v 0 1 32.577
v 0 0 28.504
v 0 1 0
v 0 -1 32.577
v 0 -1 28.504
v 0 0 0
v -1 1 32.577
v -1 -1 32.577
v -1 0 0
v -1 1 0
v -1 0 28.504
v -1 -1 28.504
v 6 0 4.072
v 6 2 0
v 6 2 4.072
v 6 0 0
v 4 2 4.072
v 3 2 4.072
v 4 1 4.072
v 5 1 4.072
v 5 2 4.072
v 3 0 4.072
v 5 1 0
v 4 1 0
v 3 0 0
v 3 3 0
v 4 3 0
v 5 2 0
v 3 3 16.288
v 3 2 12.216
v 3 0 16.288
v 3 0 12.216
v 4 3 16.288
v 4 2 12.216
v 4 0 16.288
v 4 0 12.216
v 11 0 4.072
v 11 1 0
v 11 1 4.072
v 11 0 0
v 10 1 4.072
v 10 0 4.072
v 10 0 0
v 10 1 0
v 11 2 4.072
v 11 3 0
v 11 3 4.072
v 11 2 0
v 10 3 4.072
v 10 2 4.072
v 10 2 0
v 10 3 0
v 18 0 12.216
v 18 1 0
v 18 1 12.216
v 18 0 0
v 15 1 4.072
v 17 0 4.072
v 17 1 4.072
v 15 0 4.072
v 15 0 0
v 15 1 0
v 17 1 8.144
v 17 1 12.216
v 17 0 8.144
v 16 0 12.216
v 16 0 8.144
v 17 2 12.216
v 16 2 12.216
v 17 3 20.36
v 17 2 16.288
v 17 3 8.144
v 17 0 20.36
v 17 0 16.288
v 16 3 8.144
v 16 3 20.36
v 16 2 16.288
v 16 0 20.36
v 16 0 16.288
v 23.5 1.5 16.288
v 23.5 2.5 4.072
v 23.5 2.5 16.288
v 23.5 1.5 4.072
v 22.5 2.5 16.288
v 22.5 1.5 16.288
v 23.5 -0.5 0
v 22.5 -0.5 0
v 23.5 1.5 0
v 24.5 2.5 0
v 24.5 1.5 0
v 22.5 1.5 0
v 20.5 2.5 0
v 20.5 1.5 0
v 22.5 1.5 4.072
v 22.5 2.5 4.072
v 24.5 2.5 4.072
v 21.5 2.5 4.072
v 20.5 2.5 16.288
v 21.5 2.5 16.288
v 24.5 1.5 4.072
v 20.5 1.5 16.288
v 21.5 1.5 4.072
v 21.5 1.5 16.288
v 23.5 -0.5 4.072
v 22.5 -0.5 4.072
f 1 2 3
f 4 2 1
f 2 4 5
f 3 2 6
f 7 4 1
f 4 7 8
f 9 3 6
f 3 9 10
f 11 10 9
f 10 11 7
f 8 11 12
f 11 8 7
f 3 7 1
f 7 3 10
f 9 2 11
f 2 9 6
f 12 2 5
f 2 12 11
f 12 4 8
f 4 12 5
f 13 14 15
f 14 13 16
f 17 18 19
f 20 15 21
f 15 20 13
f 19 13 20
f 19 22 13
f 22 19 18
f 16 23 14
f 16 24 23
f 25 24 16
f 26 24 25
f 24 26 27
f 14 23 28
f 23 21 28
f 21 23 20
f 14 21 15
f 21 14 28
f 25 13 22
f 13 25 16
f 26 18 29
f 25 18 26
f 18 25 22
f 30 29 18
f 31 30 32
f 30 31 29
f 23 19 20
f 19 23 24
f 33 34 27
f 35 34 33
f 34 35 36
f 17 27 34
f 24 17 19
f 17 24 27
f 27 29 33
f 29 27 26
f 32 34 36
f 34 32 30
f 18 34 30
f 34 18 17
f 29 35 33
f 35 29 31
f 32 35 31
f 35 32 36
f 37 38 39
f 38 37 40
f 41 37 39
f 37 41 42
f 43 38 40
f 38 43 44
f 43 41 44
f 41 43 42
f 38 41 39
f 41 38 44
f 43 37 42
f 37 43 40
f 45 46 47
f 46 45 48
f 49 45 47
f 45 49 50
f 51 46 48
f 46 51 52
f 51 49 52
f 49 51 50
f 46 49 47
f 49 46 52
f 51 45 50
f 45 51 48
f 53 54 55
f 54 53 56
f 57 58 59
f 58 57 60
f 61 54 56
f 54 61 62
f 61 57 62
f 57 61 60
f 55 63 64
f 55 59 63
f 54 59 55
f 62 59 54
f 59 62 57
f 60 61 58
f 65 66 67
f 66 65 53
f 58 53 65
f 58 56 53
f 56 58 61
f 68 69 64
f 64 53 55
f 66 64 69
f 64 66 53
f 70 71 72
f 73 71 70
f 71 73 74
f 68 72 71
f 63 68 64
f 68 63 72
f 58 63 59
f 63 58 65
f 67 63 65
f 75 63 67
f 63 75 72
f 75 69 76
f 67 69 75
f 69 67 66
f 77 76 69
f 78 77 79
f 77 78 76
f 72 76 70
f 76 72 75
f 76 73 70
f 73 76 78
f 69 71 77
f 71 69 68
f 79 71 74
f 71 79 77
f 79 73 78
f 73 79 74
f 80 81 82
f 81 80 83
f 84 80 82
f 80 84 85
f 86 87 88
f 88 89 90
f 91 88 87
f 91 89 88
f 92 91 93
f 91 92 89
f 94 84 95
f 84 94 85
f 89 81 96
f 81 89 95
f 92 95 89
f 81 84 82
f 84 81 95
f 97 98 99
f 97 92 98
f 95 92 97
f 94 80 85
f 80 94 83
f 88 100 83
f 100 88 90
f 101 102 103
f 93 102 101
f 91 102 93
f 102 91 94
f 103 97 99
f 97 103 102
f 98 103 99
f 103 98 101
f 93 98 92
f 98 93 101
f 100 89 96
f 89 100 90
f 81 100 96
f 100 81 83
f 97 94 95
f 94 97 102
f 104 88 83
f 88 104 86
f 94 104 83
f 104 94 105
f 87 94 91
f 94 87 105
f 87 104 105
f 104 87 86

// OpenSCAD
/*
(c) 2020 Creative Common 4.0 Attribution (BY)
https://creativecommons.org/licenses/by/4.0/

!!! For best result set View -> Orthogonal in OpenSCAD !!!

Print custom numbers by variables

Create a 3D objects in stl format. To use special symbols like +-.,:; 
pay attention to the quotes

openscad -o ./result_5_deg.stl -D "\$angle=5" -D "text=\"12:34\"" ./print_numbers.scad

or with command line variables. a - angle of view, text - text with supported symbols.
pay attention to the quotes.

a=5; 
text="12:34";
openscad -o "./result_${a}_deg.stl" -D "\$angle=$a" -D "text=\"${text}\"" ./print_numbers.scad

Make png screenshot. Angle and camera X-axis should be the same for best result.
Attention `$vpr`,`$vpt`,`$vpd` does not work in command line mode instead put data to command line according to the template `--camera=$vpt[0],$vpt[1],$vpt[2],vpr[0],$vpr[1],$vpr[2],$vpd`

a=5; 
text="12:34";
openscad -o "result_${a}_deg.png" \
    -D "\$angle=${a}" \
    -D "text=\"${text}\"" \
    --projection=o \
    --imgsize=256,256 \
    --camera=10,2,0,"${a}",0,45,70 \
    ./print_numbers.scad

OpenSCAD 2019.05
https://github.com/adorable-monkey/tech_estetika_numbers/
*/

// include <numberlib_print.scad>
include <tech_estetika_numbers.scad>
$angle=10;
// Camera configuration
$vpr=[$angle,0,45];
// Text to print
text="12:34";
$edge=1;
$x_axis_space=6;
$y_axis_space=0;
$direction="down";
numbers(str(text),$direction,$x_axis_space,$y_axis_space,$edge,$vert_edge_k);
